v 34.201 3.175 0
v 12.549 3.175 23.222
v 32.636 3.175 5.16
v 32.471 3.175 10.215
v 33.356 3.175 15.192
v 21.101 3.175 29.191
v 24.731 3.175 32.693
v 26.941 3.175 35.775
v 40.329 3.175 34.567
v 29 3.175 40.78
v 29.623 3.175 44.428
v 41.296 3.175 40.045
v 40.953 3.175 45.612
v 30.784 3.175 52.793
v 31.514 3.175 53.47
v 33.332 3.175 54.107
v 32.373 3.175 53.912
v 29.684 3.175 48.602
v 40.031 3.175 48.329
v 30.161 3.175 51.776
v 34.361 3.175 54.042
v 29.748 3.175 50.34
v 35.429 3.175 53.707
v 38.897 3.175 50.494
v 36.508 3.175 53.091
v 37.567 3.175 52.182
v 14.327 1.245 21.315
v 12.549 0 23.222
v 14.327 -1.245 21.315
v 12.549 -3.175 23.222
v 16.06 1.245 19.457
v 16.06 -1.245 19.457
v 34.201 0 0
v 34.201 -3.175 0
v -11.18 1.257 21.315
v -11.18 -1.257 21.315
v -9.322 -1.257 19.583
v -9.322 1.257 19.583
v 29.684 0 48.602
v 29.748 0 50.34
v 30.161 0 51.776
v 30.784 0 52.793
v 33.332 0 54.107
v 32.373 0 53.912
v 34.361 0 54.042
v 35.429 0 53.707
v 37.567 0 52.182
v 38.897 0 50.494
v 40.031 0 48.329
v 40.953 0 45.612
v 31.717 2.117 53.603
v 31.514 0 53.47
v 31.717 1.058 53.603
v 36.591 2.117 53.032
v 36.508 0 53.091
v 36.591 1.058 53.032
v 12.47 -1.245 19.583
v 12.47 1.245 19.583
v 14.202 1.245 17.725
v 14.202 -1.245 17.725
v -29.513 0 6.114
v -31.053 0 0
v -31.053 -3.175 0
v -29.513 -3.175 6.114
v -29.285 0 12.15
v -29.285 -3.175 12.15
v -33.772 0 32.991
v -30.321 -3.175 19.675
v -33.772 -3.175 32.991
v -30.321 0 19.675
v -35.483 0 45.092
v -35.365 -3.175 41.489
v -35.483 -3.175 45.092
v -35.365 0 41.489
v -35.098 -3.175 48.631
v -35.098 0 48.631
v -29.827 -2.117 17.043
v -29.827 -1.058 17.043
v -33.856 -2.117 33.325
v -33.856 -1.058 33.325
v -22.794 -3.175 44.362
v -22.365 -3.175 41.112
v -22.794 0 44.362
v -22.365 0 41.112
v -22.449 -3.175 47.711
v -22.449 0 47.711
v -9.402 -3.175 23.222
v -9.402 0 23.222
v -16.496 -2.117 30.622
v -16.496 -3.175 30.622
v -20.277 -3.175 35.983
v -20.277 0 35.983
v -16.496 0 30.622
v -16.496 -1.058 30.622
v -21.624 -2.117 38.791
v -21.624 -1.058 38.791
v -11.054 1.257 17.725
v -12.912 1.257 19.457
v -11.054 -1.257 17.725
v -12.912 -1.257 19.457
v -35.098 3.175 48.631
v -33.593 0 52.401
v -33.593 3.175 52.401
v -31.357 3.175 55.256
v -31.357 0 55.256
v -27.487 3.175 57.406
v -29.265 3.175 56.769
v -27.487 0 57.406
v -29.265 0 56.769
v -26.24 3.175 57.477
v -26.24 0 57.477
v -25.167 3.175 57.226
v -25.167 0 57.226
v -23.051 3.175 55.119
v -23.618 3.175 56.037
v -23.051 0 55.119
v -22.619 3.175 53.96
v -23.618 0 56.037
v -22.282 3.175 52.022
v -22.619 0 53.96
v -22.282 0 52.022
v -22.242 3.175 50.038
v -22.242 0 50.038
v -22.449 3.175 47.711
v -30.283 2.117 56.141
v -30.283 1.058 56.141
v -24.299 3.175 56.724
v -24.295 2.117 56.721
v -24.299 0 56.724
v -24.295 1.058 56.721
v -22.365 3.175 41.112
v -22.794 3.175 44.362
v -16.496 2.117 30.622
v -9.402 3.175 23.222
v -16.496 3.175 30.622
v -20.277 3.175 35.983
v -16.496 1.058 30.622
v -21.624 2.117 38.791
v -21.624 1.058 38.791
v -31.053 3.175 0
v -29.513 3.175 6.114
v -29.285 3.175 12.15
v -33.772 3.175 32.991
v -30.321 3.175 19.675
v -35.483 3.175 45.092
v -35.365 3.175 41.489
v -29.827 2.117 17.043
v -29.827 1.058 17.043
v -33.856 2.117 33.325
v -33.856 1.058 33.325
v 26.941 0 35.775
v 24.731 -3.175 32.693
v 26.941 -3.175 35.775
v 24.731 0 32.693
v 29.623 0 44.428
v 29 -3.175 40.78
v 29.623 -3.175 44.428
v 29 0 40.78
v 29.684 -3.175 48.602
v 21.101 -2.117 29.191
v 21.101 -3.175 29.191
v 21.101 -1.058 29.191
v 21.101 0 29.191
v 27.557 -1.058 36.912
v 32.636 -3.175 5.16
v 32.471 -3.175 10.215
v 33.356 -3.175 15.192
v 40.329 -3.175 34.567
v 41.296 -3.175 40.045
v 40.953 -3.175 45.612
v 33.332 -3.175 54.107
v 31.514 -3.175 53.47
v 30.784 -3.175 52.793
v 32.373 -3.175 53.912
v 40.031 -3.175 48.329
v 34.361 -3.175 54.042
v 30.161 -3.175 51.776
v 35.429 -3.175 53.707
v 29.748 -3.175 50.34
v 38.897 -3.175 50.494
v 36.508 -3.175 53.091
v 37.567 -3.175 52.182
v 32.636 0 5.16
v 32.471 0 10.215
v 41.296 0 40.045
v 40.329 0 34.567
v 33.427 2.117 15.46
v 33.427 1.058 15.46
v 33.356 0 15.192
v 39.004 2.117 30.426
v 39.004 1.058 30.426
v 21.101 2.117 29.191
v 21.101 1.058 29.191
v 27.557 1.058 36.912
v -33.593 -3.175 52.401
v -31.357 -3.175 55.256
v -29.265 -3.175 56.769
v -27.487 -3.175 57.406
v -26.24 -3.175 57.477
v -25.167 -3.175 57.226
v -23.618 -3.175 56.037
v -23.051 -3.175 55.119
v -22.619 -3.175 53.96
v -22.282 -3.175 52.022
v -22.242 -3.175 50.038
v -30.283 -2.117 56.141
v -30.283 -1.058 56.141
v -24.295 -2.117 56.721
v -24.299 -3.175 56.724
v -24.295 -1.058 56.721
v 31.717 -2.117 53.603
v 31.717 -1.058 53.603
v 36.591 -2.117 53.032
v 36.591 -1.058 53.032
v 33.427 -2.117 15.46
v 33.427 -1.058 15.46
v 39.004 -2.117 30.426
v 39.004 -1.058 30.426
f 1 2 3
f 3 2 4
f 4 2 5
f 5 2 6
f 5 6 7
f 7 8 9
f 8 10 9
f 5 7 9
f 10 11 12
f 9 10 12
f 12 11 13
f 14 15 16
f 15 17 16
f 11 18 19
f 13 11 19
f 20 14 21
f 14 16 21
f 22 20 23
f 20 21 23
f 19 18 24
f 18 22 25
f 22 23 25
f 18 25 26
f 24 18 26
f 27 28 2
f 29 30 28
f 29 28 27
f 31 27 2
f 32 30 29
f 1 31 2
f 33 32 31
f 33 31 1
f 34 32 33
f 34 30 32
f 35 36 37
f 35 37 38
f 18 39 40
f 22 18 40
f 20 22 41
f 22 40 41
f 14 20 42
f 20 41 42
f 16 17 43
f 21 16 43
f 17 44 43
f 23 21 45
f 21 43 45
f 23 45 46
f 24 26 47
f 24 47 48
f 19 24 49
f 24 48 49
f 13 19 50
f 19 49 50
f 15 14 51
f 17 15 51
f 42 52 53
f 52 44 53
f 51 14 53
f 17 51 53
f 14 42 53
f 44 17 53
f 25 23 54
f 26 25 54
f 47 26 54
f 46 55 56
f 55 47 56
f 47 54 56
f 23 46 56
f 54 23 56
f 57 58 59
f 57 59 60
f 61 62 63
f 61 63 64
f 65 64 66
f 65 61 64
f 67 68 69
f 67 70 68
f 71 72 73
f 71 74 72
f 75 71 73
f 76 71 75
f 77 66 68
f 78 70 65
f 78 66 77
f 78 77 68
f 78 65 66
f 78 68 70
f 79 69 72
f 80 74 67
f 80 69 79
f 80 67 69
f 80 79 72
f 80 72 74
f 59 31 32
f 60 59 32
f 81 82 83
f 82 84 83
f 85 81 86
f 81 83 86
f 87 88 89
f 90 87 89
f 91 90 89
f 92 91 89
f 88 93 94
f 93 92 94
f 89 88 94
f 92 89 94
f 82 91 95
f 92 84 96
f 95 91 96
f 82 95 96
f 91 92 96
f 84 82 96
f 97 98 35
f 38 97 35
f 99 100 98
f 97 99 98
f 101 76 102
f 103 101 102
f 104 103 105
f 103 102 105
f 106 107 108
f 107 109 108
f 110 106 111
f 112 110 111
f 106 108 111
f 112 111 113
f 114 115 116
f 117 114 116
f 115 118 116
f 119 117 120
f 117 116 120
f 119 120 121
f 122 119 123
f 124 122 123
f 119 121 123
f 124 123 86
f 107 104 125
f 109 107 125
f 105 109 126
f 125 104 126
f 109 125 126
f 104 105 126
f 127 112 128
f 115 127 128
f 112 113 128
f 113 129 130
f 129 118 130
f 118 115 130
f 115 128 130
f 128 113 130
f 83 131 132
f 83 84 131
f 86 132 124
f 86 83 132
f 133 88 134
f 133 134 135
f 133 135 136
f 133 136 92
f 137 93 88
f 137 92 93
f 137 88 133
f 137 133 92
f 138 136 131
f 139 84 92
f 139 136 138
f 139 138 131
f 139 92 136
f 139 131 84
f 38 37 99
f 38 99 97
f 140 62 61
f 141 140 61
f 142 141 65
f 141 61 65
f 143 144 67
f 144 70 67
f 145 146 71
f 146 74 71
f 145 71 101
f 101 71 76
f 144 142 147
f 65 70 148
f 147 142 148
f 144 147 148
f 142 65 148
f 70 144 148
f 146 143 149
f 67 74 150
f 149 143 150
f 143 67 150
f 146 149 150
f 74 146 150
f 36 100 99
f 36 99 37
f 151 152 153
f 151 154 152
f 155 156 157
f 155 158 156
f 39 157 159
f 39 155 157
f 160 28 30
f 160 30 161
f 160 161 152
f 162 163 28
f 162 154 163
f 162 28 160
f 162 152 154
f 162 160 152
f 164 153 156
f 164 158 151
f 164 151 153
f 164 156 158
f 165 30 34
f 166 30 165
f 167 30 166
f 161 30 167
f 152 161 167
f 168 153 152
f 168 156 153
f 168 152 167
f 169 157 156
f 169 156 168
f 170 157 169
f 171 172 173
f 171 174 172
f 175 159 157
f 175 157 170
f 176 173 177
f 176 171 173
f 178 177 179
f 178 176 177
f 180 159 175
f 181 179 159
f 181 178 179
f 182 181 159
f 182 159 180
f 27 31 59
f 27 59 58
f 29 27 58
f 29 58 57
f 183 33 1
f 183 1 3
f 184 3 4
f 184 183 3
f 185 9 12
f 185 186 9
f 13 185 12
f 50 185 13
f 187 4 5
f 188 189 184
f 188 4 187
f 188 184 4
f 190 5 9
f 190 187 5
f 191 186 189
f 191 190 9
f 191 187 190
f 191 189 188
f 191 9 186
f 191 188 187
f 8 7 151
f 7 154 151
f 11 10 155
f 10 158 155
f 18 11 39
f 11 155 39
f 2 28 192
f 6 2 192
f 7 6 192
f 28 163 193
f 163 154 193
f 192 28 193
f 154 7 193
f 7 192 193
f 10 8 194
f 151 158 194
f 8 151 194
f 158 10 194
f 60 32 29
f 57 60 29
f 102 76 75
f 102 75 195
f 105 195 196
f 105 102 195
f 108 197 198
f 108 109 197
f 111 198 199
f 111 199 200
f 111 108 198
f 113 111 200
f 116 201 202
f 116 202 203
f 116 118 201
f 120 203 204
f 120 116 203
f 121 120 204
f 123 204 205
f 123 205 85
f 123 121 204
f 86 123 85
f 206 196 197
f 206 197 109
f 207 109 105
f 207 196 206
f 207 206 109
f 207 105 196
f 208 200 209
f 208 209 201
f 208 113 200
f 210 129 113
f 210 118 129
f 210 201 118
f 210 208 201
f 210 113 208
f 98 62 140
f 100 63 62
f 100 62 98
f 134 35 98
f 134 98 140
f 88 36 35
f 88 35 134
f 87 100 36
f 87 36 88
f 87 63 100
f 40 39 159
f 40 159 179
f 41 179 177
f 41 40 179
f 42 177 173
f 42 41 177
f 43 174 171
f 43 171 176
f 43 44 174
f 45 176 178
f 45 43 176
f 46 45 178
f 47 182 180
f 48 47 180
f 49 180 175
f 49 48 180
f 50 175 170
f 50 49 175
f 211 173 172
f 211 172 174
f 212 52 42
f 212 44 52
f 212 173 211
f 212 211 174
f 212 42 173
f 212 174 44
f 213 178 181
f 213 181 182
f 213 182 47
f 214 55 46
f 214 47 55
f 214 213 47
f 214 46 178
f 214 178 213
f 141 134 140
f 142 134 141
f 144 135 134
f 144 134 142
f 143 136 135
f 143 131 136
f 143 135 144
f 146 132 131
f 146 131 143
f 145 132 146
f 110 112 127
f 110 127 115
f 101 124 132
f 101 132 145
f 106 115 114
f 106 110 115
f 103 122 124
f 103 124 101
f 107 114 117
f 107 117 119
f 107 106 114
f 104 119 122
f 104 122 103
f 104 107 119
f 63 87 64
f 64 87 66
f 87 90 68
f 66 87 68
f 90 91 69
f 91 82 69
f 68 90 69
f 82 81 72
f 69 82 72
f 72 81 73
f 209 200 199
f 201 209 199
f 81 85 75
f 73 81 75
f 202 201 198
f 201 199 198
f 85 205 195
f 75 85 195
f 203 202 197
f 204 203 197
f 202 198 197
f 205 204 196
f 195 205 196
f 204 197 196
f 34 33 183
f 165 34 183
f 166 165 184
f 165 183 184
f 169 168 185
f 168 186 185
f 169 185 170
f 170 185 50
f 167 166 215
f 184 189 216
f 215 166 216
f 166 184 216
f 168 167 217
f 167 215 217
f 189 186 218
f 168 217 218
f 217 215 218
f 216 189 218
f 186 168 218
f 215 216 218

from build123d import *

# Parameters (mm, degrees)
F1_DEPTH = 3.175
F3_W     = 2.5146
F3_H     = 2.54
F4_DEPTH = 2.54
F6_W     = 2.4892
F6_H     = 2.54
F7_DEPTH = 2.54


with BuildPart() as f1:
    # F0 (on Front) → F1 (new body, symmetric)
    with BuildSketch(Plane.XZ):
        with BuildLine():
            add(Edge.make_bspline(
                [(-31.0533456504, 0), (-24.5187859982, 17.3532310873), (-37.9303842783, 33.8830426335), (-35.0979678333, 48.6308038235)],
                knots=[0, 0, 0, 0, 48.7987095026, 48.7987095026, 48.7987095026, 48.7987095026], degree=3))
            Line((-31.0533456504, 0), (-9.4017383467, 23.2221963037))
            add(Edge.make_bspline(
                [(-9.4017383467, 23.2221963037), (-16.6993923485, 30.2322339267), (-24.5547145605, 38.4201221168), (-22.4489457905, 47.7108769119)],
                knots=[0, 0, 0, 0, 27.7475242141, 27.7475242141, 27.7475242141, 27.7475242141], degree=3))
            add(Edge.make_bspline(
                [(-35.0979678333, 48.6308038235), (-32.6407961547, 58.7211176753), (-20.4517394304, 62.400829047), (-22.4489457905, 47.7108769119)],
                knots=[0, 0, 0, 0, 12.682429742, 12.682429742, 12.682429742, 12.682429742], degree=3))
        make_face()
    extrude(amount=F1_DEPTH, both=True)

    # F3 (on offset) → F4 (join)
    with BuildSketch(Plane(origin=(-16.6122141895, 0, 15.4886787354), x_dir=(0, 1, 0), z_dir=(0.7314077576, 0, -0.6819403875))):
        with Locations((0, 6.6961594334)):
            Rectangle(F3_W, F3_H)
    extrude(amount=F4_DEPTH)


with BuildPart() as f1b:
    # F0 (on Front) → F1, piece 2 (new body, symmetric)
    with BuildSketch(Plane.XZ):
        with BuildLine():
            Line((12.5494186591, 23.2221963037), (34.2010259628, 0))
            add(Edge.make_bspline(
                [(34.2010259628, 0), (26.9245896488, 15.9444343299), (44.1446974874, 30.0780516118), (40.9534983337, 45.6121340394)],
                knots=[0, 0, 0, 0, 46.1092469549, 46.1092469549, 46.1092469549, 46.1092469549], degree=3))
            add(Edge.make_bspline(
                [(29.6843722463, 48.6019067466), (29.1780382395, 55.9630095959), (37.9637293518, 56.8812638521), (40.9534983337, 45.6121340394)],
                knots=[0, 0, 0, 0, 11.6589855311, 11.6589855311, 11.6589855311, 11.6589855311], degree=3))
            add(Edge.make_bspline(
                [(12.5494186591, 23.2221963037), (21.4050151408, 29.0534161031), (30.4661523551, 34.1877490282), (29.6843722463, 48.6019067466)],
                knots=[0, 0, 0, 0, 30.6224809022, 30.6224809022, 30.6224809022, 30.6224809022], degree=3))
        make_face()
    extrude(amount=F1_DEPTH, both=True)

    # F6 (on offset) → F7 (join)
    with BuildSketch(Plane(origin=(18.2960887755, 0, 17.0586676721), x_dir=(0, -1, 0), z_dir=(-0.7314077576, 0, -0.6819403875))):
        with Locations((0, 4.5496291014)):
            Rectangle(F6_W, F6_H)
    extrude(amount=F7_DEPTH)


solid = Compound([f1.part, f1b.part])
